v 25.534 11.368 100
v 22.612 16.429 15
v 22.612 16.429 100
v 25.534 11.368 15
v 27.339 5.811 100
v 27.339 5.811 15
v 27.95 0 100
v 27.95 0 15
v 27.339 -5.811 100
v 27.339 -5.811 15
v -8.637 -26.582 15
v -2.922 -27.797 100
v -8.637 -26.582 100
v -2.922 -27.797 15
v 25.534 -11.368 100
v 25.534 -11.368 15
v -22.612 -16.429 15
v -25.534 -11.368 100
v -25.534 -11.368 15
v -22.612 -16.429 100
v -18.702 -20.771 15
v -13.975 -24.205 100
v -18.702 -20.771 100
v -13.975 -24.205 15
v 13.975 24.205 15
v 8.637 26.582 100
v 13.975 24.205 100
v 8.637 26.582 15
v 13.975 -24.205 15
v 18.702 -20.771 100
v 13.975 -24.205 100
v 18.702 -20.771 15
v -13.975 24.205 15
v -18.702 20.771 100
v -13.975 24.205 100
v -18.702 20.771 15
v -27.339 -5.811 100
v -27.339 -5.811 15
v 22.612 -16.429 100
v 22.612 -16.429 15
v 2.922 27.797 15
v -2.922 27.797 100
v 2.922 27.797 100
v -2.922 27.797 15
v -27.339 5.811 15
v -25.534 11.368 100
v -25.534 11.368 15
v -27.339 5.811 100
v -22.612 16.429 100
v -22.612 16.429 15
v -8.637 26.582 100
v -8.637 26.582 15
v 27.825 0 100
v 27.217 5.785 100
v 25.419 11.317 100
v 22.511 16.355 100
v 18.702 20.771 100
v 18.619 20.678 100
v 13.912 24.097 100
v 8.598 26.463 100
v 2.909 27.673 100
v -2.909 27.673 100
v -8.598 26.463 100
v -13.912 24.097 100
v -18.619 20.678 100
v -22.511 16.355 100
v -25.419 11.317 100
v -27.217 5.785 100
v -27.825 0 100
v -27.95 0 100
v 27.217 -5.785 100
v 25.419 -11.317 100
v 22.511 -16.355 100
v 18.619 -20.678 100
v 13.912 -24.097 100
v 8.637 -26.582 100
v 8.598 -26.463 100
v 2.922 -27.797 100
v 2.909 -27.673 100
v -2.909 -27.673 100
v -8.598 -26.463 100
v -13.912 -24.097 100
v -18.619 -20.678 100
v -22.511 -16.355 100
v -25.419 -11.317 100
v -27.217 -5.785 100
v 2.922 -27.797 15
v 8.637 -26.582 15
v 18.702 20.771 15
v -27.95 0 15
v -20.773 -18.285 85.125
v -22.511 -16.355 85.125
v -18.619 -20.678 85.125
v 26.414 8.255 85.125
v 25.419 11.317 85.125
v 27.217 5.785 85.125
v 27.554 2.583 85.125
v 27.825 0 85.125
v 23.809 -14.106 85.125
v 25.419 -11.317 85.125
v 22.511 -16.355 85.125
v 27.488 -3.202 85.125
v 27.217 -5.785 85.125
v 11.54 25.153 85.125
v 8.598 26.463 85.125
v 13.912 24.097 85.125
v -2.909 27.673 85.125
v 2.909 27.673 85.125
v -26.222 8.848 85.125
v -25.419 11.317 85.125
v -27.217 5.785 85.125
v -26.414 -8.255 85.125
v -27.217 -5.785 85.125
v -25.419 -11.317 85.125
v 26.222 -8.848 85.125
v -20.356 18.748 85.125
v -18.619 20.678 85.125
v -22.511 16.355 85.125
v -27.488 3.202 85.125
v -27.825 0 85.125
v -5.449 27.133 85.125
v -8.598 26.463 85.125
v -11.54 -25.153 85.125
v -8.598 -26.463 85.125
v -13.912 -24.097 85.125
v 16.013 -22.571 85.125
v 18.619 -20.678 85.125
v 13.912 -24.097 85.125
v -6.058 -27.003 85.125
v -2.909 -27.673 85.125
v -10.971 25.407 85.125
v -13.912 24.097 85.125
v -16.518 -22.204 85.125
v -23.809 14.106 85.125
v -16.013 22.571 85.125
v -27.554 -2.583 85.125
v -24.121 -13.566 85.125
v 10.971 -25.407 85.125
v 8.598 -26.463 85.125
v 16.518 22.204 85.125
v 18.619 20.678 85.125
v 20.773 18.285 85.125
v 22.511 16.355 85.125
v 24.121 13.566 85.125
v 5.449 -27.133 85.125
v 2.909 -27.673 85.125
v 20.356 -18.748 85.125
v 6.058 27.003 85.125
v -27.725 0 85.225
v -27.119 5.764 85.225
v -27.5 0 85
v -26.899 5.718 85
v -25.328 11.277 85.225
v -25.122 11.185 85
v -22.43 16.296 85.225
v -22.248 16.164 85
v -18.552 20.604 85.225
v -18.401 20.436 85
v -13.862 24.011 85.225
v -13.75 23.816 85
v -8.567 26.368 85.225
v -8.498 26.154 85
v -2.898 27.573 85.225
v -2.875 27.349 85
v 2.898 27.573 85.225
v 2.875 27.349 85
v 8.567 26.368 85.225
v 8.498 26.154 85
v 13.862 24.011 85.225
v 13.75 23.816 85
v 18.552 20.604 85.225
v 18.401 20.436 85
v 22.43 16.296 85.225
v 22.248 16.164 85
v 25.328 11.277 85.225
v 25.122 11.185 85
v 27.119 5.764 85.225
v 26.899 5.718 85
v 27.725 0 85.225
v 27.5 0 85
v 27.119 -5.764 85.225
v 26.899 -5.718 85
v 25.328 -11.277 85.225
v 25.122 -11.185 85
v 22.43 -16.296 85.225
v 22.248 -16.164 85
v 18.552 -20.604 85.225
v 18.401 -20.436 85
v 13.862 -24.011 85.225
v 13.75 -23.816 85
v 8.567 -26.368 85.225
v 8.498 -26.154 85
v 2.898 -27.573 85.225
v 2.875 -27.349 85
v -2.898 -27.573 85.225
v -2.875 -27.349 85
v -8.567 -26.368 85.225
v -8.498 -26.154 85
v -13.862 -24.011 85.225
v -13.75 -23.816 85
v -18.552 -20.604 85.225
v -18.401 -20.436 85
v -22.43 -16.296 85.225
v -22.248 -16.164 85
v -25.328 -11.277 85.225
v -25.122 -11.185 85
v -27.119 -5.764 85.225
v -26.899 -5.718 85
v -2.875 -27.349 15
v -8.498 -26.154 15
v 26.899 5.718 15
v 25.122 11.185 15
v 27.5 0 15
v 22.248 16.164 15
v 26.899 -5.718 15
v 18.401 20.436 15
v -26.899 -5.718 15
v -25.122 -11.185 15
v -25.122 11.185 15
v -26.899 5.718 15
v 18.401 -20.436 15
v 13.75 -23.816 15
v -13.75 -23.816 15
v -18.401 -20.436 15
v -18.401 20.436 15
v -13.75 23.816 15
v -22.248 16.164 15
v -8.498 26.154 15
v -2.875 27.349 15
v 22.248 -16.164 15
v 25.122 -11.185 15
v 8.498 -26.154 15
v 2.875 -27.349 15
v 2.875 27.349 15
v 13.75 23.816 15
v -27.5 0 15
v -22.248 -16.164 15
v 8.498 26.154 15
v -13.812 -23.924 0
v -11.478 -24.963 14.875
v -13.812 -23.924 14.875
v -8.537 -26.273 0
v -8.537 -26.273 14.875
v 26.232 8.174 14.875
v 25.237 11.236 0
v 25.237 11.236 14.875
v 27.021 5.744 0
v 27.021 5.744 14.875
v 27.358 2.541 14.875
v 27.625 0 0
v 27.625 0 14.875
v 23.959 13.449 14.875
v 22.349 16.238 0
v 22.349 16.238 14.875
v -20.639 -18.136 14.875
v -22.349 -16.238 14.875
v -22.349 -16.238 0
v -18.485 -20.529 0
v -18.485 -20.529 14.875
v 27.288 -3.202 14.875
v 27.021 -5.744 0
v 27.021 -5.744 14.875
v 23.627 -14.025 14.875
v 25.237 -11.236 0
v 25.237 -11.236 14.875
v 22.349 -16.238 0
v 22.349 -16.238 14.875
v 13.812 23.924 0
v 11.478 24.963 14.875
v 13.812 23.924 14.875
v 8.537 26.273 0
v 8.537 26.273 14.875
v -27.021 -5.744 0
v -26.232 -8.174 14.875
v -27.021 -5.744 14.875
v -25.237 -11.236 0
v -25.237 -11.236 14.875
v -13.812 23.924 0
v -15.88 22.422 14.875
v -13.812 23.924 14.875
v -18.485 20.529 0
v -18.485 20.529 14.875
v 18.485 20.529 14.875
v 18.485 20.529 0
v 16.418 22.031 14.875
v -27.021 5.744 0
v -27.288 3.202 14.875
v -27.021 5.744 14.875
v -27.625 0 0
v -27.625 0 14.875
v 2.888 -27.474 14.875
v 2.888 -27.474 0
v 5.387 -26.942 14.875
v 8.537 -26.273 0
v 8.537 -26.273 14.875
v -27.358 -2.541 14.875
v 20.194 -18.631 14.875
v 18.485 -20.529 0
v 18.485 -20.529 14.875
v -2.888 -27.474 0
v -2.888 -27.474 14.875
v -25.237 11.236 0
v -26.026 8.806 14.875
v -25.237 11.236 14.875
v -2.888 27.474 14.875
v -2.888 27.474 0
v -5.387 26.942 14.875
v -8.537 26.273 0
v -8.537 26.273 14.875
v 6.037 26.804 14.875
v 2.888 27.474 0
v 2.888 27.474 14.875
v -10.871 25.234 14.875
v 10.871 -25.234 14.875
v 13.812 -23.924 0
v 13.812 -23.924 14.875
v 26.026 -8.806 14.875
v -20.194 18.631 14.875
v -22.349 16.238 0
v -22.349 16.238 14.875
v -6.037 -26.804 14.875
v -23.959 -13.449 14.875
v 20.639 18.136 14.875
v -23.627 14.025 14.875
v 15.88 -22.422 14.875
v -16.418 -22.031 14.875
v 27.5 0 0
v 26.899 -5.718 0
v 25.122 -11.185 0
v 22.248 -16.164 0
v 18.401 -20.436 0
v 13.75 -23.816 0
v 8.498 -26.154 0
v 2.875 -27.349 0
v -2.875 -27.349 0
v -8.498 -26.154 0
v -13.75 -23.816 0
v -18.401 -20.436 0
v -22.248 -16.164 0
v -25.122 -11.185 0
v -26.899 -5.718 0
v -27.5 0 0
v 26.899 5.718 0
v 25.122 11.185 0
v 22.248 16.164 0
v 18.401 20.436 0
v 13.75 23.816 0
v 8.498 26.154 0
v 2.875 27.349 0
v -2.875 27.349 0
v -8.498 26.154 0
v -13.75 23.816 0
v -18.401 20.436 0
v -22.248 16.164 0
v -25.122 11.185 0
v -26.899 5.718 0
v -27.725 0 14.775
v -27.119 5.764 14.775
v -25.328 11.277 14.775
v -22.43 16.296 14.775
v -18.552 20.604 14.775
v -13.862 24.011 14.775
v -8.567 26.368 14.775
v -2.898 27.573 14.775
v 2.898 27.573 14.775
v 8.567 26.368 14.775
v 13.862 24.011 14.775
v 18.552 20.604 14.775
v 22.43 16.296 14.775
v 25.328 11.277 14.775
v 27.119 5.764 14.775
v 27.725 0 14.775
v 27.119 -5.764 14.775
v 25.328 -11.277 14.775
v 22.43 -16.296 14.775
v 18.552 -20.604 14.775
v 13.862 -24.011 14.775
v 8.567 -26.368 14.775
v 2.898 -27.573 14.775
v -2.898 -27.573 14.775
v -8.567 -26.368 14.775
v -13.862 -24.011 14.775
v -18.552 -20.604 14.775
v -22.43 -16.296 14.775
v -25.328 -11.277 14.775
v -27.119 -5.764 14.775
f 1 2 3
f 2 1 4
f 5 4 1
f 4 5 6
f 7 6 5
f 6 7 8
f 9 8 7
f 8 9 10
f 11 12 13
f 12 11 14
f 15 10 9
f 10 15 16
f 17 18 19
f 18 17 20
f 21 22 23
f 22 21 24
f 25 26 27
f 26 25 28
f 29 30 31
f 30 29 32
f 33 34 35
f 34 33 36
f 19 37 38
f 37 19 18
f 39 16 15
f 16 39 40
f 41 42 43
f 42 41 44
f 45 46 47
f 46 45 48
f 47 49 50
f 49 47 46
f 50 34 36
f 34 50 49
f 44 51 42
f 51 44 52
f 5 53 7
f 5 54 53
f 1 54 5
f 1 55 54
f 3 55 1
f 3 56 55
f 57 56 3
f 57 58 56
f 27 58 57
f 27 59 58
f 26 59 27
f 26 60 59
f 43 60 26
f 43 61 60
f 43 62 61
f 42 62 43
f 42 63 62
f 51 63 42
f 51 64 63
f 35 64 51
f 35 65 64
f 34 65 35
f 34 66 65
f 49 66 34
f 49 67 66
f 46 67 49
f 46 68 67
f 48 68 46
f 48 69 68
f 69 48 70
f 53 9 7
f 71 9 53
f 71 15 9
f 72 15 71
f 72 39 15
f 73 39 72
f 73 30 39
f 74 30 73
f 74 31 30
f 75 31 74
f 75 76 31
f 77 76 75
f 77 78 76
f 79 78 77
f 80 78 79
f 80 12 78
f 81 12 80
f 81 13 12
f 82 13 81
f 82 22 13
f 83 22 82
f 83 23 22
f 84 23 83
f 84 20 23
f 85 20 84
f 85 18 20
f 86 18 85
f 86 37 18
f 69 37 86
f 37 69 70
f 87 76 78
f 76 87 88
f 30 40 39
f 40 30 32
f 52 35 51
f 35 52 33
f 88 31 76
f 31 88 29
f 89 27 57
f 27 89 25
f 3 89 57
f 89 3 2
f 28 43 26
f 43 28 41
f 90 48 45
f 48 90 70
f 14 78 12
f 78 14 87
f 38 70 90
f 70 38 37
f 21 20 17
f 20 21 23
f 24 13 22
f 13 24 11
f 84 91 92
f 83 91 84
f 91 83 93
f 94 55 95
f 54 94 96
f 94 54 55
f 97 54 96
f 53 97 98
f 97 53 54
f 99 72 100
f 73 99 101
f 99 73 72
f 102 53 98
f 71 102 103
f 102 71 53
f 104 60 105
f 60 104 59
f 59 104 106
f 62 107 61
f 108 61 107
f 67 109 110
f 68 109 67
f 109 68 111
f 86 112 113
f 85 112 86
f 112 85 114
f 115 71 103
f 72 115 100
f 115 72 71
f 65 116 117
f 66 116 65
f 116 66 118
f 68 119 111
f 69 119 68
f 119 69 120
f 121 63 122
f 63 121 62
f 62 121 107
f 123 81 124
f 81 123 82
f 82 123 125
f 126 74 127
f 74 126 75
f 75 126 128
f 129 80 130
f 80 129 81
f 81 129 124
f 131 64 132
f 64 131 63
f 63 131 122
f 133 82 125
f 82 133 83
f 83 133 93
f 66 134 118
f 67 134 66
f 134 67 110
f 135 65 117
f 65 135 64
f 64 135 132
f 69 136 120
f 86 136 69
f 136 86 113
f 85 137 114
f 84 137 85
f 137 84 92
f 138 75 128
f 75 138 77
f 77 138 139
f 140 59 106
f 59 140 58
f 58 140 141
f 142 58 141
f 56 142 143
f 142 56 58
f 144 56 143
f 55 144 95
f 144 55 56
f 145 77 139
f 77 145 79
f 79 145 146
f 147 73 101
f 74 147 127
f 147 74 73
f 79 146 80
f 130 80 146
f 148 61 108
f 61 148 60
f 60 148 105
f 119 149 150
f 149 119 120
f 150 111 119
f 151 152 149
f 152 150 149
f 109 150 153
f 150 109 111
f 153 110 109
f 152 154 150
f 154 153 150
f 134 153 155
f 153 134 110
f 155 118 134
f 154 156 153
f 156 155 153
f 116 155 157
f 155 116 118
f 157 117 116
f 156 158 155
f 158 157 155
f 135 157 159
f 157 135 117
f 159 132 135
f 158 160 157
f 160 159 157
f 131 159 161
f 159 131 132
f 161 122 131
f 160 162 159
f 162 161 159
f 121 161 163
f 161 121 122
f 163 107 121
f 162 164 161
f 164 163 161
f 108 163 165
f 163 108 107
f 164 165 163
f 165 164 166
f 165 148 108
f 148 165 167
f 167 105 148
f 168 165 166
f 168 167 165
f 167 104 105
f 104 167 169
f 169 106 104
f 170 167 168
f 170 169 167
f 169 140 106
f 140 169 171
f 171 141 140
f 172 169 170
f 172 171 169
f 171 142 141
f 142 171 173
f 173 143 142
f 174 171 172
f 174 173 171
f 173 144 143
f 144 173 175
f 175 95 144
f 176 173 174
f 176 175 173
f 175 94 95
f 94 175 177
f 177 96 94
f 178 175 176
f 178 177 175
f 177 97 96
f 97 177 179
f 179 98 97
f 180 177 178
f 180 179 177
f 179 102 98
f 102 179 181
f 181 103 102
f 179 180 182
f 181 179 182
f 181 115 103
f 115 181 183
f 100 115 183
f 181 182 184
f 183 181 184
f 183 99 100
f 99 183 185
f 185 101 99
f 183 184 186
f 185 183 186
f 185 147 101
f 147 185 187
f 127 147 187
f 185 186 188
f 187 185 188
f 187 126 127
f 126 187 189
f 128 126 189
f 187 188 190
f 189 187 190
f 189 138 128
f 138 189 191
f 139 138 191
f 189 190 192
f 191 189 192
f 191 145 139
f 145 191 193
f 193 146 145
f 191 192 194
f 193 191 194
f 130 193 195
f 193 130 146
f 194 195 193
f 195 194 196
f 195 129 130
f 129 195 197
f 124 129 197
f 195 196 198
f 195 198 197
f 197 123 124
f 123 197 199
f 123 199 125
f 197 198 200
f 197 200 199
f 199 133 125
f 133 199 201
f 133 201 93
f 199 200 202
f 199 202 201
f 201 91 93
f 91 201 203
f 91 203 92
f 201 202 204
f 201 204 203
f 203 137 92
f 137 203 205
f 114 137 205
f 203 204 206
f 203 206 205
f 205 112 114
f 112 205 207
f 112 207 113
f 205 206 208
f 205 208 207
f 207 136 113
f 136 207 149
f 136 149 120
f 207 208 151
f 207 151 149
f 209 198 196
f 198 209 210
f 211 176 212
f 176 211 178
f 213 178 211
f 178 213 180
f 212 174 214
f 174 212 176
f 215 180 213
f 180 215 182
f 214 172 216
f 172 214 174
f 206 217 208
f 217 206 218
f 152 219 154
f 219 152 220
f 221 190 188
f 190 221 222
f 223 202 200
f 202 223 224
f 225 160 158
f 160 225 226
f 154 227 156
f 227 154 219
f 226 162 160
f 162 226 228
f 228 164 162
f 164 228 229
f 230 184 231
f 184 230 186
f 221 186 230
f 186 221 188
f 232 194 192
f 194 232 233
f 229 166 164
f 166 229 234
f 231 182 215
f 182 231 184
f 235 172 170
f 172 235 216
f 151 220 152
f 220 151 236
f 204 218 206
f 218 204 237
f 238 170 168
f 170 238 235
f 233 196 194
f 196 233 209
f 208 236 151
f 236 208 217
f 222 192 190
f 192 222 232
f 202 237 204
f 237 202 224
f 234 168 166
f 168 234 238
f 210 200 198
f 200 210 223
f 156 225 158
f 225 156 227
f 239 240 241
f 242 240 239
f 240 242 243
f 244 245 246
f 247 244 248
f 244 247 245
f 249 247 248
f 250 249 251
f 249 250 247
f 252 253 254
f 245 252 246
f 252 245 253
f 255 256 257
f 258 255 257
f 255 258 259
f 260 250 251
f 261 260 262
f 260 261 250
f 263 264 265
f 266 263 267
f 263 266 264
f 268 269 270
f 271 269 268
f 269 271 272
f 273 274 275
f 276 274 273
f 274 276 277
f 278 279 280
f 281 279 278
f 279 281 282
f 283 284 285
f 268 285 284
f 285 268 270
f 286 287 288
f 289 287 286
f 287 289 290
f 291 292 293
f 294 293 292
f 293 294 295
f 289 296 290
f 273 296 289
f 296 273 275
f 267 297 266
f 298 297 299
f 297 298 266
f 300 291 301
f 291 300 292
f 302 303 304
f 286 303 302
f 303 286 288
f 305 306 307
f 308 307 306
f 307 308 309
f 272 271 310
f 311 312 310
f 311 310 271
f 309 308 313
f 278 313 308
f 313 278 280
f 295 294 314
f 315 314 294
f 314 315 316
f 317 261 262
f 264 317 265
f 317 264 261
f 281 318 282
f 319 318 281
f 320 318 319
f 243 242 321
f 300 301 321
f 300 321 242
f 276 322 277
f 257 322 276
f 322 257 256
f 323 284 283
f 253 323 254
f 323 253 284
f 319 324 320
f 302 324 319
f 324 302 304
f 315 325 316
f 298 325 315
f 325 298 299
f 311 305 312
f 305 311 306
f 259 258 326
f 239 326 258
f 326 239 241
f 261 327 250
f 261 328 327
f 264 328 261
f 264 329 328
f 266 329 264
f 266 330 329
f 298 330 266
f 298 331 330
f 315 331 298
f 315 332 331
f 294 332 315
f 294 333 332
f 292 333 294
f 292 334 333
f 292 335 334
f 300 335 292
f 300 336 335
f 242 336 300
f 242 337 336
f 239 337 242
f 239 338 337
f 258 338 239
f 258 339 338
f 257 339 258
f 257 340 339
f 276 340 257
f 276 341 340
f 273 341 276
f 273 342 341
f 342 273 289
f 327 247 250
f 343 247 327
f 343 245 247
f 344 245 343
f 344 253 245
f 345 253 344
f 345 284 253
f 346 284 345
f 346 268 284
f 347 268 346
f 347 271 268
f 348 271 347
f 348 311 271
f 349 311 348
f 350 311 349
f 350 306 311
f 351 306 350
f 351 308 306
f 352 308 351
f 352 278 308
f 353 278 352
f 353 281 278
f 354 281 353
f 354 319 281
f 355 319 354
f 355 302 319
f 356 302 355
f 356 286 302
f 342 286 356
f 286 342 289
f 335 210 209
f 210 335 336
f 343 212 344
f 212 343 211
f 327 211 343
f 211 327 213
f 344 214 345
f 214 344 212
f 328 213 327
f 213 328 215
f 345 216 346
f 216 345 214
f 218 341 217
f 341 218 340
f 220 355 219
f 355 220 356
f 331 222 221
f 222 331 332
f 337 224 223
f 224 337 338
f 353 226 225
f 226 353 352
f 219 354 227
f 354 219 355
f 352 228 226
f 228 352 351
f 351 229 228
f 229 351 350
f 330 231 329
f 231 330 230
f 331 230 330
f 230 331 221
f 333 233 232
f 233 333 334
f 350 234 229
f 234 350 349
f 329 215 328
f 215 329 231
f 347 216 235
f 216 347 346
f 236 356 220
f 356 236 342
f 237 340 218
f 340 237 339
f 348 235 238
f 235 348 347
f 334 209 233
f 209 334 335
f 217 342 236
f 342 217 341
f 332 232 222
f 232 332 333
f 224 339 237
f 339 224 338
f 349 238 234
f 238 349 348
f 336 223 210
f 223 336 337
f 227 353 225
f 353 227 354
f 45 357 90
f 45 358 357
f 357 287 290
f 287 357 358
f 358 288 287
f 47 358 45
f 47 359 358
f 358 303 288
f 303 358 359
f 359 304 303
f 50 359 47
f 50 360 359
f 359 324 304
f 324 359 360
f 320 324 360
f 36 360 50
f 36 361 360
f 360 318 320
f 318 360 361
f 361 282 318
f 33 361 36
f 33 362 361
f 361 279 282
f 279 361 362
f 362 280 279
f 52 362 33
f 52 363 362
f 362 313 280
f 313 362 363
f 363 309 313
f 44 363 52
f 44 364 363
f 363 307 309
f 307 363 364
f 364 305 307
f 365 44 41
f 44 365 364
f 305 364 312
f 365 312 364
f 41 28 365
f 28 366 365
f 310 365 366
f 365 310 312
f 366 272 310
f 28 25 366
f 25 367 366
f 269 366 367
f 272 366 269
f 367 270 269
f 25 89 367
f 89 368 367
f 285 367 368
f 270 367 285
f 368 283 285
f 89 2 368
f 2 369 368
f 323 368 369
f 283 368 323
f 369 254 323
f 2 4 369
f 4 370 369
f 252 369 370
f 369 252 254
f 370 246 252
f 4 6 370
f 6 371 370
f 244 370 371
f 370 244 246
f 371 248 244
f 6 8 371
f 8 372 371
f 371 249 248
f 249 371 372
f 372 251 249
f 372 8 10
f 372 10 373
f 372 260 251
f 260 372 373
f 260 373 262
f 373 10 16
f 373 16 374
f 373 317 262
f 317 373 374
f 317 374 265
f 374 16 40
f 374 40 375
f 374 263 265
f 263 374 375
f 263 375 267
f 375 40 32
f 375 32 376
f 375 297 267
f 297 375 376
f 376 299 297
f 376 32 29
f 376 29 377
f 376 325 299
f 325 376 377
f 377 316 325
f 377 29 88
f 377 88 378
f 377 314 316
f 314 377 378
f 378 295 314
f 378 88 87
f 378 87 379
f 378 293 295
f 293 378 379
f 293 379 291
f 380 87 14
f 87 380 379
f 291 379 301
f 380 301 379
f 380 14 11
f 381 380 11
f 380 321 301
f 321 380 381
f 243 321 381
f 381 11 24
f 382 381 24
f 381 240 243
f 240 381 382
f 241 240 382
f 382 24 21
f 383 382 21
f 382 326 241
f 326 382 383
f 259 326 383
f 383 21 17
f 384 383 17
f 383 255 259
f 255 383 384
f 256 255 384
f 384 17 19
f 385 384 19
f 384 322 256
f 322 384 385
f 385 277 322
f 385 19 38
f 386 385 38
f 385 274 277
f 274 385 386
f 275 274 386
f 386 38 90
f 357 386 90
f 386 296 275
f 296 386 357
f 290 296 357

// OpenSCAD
// file: components/functions.scad
function outerDiam(intDiameter, wallThck) = intDiameter + 2 * wallThck;
// file: components/Fittings.scad
use <functions.scad>
// include <../Settings.scad>

// debug object
union() {
    wallThicknes=0.45*1;
    internalDiameter=50;
    overlap=15;
    
    $fn=150;
    tlrnc = 0.1;
    w=wallThicknes;
    translate ([0,0, 10]) 
        fitting(overlap, internalDiameter, w, tlrnc);
    topFitting(overlap, internalDiameter, w, tlrnc);
}


module interFit(dOut, intDiam) {
    angle=45;
    w = (dOut - intDiam)/2;
    sqSize = sqrt(w*w/2);
    rotate_extrude()
        translate([intDiam/2 + w/2, 0, 0]) 
            rotate([0,0,angle]) 
                square(sqSize, true);
}

module topFitting(ovrlp, intDiam, wlThckns, tlrnc=0.1) {
    interFitDiam = intDiam + wlThckns + 2*tlrnc;
    dOut = outerDiam(intDiam, wlThckns);
    fitterWall = (dOut - interFitDiam)/2;
    tube(ovrlp, interFitDiam, fitterWall);
    interFit(dOut, intDiam);
}

module fitting(ovrlp, intDiam, wlThckns, tlrnc=0.1) {
    interFitDiam = intDiam + wlThckns - 2*tlrnc;
    fitterWall = (interFitDiam - intDiam)/2;
    tube(ovrlp, intDiam, fitterWall);
    dOut = outerDiam(intDiam, wlThckns);
    translate([0,0,ovrlp]) 
        interFit(dOut, intDiam);
}

module tube(length, intDiam, wlThckns) {
    dz = 0.01; /// size difference for improve quick rendering
    difference() {
        cylinder(h=length, d=intDiam + 2*wlThckns);
        translate([0,0,-dz]) cylinder(h=length + 2*dz, d=intDiam);
    }
}
// main file
use <components/Fittings.scad>
/// coments
//params
// include <Settings.scad>

wallThicknes=0.45*1;
internalDiameter=55;
overlap=15;
tubeLength=100;
tlrnc = 0.1;

MainTube(tubeLength, internalDiameter, wallThicknes, overlap, tlrnc);

module MainTube(length, intDiameter, wThickness, ovrlp, tlrnc) {
    translate([0, 0, length - ovrlp]) topFitting(ovrlp, intDiameter, wThickness, tlrnc);
    translate([0,0, ovrlp]) tube(length - 2* ovrlp, intDiameter, wThickness);
    fitting(ovrlp, intDiameter, wThickness, tlrnc);
}
